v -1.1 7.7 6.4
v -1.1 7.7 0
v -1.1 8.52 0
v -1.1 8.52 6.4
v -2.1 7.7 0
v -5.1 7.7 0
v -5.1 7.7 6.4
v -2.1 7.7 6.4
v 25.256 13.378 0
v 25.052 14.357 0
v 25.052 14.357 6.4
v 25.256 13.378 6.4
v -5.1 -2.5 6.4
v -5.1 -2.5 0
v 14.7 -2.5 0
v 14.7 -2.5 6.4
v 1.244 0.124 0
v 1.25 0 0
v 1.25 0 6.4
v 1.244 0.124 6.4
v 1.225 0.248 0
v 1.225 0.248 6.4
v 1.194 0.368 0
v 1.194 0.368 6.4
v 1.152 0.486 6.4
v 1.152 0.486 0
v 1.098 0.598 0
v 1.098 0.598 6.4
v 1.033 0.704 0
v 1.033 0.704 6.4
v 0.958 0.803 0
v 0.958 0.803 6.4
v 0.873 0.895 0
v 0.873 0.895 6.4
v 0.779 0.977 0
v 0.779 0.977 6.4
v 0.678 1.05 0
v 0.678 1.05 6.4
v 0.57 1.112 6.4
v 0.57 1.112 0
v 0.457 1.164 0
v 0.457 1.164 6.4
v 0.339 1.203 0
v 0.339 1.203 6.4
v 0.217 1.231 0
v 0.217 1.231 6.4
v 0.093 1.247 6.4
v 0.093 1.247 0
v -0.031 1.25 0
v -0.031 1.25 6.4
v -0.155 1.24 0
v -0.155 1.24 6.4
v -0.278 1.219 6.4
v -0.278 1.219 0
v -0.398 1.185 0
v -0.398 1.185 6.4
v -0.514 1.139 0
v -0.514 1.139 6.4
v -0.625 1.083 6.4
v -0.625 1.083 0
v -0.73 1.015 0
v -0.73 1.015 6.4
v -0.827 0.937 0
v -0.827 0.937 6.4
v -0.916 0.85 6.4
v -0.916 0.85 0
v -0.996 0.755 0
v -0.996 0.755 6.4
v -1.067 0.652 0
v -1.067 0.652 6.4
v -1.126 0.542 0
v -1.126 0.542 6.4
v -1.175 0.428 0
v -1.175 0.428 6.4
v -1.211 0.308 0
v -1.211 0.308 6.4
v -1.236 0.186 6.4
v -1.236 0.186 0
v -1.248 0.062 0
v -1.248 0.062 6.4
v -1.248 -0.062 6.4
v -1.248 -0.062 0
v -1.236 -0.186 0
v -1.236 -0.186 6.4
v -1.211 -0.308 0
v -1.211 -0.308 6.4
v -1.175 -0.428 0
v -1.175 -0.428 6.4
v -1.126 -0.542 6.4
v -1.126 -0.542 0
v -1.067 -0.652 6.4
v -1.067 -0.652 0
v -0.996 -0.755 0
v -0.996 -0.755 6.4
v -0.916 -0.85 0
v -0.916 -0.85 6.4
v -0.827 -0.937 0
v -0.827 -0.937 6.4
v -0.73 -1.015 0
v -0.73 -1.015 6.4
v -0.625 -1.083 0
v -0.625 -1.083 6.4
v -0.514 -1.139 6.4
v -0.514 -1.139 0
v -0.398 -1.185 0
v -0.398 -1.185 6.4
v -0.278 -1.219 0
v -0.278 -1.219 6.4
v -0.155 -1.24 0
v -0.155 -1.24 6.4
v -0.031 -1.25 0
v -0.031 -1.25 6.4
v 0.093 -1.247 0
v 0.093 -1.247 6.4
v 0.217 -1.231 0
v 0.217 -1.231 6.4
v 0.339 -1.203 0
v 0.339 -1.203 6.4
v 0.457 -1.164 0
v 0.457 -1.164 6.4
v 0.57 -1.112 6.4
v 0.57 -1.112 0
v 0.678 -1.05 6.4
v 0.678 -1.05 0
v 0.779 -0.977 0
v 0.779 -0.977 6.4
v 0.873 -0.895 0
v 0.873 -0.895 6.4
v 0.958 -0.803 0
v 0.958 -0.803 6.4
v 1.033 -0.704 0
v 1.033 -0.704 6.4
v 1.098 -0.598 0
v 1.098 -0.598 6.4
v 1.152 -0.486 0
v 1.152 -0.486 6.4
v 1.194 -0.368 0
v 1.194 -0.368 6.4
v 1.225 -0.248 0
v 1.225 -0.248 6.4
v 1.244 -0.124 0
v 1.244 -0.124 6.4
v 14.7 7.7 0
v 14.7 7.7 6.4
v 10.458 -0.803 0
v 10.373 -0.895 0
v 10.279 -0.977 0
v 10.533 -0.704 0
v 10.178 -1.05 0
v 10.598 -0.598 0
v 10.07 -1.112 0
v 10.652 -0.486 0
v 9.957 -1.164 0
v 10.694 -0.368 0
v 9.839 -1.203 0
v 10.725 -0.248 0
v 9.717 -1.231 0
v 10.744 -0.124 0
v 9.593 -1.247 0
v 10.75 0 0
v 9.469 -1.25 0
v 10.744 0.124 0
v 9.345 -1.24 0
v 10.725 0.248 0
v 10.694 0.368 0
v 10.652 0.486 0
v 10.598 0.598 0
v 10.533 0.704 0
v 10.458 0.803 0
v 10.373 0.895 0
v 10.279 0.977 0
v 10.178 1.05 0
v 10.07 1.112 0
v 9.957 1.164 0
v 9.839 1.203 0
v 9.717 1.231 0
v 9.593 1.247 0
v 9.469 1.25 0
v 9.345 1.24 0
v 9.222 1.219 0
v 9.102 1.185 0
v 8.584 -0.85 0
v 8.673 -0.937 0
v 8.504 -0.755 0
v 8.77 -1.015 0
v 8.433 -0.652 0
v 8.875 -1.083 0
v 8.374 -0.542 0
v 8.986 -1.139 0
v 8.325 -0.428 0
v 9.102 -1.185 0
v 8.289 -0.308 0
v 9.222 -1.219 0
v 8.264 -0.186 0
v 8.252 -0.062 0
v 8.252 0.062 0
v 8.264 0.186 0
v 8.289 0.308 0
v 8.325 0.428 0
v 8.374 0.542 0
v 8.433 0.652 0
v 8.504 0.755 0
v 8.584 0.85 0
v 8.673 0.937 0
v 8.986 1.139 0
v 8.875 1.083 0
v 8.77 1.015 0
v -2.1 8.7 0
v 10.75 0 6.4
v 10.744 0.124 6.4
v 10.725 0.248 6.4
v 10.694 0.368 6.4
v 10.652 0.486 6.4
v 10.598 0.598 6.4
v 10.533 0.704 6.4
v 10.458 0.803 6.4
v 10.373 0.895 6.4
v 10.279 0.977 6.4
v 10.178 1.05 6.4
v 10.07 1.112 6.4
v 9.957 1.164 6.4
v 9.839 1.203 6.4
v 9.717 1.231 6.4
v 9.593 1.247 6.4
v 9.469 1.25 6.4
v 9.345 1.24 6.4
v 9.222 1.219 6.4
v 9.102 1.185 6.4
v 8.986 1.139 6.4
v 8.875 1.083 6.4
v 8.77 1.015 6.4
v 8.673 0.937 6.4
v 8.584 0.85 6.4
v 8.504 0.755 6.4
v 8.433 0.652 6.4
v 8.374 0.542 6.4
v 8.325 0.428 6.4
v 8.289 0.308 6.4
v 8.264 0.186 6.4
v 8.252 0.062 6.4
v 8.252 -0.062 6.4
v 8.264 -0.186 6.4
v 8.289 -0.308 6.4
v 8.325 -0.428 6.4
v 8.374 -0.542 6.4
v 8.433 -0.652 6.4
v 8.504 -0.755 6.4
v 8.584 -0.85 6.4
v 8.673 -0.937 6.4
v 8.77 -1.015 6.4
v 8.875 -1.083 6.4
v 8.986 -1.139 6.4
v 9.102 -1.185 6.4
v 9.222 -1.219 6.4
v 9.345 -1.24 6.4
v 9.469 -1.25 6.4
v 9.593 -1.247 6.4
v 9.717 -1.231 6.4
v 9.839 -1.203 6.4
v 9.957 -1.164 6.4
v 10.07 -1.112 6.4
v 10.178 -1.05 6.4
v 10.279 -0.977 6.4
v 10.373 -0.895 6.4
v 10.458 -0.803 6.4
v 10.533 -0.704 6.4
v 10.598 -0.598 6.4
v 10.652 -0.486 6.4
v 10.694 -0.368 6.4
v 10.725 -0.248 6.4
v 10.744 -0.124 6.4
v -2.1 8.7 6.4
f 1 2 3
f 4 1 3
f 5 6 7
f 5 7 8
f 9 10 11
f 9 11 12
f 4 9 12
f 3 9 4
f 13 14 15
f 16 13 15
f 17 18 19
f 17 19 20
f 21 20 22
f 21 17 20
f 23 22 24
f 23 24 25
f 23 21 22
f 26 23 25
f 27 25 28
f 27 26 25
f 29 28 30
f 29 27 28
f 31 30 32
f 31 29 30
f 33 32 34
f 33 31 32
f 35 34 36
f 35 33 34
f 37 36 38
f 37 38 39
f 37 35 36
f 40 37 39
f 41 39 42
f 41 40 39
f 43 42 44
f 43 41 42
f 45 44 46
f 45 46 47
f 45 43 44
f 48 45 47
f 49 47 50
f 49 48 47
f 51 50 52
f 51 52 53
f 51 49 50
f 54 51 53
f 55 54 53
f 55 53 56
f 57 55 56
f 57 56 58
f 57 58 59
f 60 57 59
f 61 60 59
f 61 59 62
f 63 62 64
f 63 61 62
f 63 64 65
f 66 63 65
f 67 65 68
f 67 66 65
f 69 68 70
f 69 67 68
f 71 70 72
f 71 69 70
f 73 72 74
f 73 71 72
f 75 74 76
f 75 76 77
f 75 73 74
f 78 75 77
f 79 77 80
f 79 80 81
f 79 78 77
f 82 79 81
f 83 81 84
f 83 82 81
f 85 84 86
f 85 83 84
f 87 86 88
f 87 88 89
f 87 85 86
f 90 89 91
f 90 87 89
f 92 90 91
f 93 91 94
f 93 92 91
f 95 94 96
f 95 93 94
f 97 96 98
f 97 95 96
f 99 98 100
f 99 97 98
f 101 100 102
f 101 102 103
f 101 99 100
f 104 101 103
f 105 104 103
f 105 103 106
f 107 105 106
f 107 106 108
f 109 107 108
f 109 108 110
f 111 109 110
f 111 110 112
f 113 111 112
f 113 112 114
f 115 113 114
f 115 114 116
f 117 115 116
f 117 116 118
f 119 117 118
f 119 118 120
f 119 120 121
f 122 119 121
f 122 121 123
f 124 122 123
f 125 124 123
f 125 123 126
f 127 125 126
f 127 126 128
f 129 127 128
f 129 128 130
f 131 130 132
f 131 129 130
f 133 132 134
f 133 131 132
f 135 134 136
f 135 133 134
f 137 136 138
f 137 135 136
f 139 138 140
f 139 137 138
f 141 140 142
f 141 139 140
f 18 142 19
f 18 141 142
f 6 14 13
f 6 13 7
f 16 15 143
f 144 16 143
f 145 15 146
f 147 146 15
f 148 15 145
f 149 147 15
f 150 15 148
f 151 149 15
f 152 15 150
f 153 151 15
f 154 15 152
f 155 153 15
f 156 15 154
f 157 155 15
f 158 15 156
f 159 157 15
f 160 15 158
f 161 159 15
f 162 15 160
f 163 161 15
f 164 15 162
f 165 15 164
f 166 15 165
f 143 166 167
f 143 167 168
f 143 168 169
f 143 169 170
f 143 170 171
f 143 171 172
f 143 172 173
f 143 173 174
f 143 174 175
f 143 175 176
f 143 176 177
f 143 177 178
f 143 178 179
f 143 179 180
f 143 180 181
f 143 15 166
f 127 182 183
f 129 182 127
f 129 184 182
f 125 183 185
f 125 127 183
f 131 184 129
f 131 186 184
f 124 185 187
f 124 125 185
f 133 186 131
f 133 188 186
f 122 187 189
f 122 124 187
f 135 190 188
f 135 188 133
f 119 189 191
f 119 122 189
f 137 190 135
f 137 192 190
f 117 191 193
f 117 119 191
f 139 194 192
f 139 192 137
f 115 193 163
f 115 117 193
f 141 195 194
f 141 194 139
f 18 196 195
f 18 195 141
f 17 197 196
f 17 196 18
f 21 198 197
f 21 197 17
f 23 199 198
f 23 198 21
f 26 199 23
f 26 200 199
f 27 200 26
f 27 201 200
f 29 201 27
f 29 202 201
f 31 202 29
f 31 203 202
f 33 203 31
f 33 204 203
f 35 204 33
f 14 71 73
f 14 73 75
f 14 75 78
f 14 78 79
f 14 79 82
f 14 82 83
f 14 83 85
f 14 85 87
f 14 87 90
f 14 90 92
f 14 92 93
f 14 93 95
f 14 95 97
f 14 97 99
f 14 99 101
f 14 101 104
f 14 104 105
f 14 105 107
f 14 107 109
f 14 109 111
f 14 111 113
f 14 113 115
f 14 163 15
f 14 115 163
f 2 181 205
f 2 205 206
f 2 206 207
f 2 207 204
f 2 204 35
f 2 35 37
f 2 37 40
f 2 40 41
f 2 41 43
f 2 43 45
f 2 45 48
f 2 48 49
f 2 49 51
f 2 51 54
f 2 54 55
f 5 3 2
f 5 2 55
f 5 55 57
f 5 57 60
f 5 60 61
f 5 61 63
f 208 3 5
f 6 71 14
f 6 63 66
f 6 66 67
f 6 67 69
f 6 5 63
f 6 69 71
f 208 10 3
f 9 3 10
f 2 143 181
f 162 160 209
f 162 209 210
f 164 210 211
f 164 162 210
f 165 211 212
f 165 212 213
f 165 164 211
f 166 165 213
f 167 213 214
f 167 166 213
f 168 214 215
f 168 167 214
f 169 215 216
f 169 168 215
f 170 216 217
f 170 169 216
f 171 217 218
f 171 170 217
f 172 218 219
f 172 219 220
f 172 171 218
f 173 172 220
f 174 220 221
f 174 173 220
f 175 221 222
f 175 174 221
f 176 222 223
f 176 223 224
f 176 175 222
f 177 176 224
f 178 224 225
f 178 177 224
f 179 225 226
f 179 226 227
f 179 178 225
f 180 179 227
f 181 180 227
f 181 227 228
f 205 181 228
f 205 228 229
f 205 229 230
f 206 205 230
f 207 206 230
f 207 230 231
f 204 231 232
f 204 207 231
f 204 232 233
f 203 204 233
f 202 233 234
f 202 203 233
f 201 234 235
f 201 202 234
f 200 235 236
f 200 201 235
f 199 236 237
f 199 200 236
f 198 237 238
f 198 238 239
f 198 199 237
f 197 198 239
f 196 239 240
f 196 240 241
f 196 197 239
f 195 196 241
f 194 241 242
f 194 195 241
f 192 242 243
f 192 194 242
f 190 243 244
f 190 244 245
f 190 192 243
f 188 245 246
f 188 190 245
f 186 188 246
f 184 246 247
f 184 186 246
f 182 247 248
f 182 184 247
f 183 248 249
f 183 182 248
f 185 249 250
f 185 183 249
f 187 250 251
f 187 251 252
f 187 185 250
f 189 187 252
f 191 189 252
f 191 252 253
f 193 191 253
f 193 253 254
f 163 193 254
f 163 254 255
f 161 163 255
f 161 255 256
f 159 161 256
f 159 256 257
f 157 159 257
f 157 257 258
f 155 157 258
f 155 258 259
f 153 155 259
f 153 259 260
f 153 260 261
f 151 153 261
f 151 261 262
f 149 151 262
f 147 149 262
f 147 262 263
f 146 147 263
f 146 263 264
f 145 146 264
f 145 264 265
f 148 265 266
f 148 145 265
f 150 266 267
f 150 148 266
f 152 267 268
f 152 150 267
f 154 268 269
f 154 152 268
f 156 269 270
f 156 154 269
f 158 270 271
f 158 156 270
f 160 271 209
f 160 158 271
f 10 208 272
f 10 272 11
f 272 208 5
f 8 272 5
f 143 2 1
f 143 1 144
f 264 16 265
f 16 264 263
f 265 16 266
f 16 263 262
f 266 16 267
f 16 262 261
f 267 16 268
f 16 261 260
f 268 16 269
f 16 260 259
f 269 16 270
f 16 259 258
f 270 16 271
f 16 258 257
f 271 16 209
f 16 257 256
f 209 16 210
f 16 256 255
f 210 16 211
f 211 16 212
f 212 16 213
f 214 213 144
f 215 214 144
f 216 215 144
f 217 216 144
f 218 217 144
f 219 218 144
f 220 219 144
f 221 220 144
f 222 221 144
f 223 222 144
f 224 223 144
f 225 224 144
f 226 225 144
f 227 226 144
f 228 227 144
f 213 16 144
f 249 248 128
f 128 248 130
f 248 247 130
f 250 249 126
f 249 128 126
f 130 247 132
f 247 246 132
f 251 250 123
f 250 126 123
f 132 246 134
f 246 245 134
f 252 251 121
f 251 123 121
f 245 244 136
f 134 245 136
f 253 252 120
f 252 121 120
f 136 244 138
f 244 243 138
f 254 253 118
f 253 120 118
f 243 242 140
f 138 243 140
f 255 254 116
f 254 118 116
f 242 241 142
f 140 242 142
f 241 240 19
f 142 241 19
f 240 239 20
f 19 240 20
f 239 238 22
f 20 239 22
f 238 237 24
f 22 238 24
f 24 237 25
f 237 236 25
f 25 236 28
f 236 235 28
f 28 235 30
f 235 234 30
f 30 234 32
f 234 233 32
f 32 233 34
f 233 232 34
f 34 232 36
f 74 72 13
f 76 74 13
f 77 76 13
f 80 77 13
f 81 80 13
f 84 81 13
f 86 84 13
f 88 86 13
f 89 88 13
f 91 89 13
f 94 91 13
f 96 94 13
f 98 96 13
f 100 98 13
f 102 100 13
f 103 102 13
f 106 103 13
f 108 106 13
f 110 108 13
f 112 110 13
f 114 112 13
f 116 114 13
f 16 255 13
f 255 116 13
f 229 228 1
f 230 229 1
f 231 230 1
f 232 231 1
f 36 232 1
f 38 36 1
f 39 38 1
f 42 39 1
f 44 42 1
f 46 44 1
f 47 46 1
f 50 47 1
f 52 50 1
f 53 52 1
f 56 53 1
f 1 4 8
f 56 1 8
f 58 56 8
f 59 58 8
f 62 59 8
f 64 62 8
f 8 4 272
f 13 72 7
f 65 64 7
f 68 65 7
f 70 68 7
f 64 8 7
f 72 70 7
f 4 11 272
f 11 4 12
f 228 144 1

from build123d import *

# Parameters (mm, degrees)
SKETCH_1_W      = 19.8
SKETCH_1_H      = 10.2
SKETCH_1_R      = 1.25
EXTRUDE_1_DEPTH = 6.4


with BuildPart() as part:
    # 草图1 → 凸台-拉伸1 (new body)
    # profile 1 of 3: a face of its own
    with BuildSketch(Plane.XY):
        with Locations((4.8, 2.6)):
            Rectangle(SKETCH_1_W, SKETCH_1_H)
        with Locations((9.5, 0)):
            Circle(SKETCH_1_R, mode=Mode.SUBTRACT)
        Circle(SKETCH_1_R, mode=Mode.SUBTRACT)
    # profile 2 of 3: a face of its own
    with BuildSketch(Plane.XY):
        Polygon((-2.1, 8.7), (-2.1, 7.7), (-1.1, 7.7), (-1.1, 8.520009061), align=None)
    # profile 3 of 3: a face of its own
    with BuildSketch(Plane.XY):
        Polygon((-2.1, 8.7), (25.05212145, 14.356691969), (25.256075705, 13.377711549), (-1.1, 8.520009061), align=None)
    extrude(amount=EXTRUDE_1_DEPTH)


solid = part.part
